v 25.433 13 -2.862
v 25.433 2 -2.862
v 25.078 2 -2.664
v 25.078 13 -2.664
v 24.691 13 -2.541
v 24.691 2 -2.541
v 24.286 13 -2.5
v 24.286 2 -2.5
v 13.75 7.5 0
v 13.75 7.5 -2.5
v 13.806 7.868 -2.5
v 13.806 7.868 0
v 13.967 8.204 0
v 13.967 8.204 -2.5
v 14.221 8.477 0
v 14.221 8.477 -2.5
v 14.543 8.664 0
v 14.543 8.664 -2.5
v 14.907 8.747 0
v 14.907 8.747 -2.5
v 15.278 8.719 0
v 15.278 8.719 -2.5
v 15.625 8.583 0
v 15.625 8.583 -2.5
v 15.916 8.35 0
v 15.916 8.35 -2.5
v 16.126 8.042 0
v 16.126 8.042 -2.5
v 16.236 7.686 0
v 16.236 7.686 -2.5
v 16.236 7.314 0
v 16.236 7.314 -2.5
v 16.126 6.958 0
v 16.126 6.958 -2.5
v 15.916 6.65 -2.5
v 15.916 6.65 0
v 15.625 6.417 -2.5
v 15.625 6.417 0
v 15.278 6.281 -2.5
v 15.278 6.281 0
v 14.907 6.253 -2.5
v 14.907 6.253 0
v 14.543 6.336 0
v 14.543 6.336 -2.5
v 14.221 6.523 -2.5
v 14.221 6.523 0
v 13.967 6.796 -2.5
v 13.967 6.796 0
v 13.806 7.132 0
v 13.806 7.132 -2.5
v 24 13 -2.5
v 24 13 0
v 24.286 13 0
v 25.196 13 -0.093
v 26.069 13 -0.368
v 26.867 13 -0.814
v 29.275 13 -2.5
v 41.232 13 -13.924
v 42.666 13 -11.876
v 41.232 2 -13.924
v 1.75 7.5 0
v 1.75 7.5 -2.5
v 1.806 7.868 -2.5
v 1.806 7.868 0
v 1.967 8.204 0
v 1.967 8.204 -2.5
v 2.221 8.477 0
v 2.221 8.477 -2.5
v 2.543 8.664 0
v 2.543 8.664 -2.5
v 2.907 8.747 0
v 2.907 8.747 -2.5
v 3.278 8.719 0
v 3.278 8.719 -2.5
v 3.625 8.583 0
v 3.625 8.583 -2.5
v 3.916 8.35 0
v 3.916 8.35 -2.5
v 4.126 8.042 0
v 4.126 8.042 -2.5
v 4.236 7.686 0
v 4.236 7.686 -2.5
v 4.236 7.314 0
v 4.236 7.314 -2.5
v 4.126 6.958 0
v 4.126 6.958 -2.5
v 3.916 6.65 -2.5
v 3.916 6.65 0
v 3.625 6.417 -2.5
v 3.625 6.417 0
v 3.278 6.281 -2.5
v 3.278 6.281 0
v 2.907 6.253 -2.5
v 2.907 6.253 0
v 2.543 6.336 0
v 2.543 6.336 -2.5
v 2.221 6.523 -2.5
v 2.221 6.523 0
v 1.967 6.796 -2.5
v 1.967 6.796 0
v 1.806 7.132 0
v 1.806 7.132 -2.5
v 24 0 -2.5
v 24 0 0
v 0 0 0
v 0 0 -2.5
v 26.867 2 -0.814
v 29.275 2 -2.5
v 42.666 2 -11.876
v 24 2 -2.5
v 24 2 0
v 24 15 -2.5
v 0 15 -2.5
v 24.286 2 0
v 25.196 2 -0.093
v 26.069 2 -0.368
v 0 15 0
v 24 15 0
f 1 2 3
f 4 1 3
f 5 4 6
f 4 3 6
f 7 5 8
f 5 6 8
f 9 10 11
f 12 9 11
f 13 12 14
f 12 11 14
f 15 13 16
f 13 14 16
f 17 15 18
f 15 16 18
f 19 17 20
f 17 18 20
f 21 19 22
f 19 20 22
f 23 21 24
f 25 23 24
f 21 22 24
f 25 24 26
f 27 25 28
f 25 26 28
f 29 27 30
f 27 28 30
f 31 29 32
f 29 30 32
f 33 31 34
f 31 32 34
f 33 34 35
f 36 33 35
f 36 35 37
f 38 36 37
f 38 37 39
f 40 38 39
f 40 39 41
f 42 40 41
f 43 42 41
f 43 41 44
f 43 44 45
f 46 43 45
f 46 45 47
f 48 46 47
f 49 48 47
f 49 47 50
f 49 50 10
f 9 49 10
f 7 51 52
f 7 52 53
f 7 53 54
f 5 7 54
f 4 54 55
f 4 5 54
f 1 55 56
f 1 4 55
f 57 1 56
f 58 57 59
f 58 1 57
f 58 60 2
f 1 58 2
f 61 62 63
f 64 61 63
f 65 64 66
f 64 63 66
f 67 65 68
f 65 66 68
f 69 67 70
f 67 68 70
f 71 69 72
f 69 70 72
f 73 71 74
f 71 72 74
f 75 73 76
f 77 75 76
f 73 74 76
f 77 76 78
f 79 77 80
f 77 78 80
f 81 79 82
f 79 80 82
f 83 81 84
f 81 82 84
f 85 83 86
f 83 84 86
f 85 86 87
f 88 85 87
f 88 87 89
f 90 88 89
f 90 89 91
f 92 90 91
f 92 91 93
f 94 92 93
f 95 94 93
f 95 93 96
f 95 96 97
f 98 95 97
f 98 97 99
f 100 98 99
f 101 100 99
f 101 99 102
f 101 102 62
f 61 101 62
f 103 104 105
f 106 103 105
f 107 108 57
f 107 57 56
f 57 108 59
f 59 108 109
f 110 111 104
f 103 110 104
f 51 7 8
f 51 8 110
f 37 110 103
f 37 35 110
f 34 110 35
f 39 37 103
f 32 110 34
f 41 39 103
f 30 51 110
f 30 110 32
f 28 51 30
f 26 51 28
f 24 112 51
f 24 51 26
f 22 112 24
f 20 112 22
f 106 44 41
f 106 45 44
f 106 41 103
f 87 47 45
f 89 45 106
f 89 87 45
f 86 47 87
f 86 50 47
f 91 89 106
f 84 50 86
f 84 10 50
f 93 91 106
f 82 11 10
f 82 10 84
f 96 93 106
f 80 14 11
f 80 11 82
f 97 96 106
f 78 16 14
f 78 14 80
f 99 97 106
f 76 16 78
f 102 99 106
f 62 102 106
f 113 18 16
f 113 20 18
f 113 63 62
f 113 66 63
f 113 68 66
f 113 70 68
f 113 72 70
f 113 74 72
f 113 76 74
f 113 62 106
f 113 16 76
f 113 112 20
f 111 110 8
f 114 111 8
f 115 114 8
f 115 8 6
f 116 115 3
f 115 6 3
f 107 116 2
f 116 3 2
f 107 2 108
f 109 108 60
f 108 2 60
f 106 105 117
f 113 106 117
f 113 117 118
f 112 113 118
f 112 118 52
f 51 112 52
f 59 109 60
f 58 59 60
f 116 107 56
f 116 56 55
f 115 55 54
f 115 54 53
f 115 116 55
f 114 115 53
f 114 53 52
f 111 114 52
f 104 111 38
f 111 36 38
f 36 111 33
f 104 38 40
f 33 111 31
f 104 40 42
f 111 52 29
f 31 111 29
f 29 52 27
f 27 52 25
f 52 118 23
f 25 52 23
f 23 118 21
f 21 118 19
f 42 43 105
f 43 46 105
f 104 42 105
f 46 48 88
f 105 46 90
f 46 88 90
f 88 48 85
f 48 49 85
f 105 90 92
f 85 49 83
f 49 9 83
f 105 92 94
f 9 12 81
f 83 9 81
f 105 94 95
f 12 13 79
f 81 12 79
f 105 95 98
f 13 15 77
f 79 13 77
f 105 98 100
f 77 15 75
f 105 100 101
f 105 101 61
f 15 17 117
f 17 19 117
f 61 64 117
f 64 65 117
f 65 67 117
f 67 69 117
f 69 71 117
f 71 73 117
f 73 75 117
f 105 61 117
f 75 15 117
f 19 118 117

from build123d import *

# Parameters (mm, degrees)
SM_BASE_FLANGE_1_DEPTH = 2.5
HOLE_WIZARD_M31_D      = 2.5
HOLE_WIZARD_M31_DEPTH  = 8.5
HOLE_WIZARD_M31_TIP    = 0.751075774
OTHER_START            = 2
OTHER_1_DEPTH          = 11
OTHER_1_2_DEPTH        = 11


# Read off the part's stored shape, not the designer's step: Нарисованный сгиб1
# Sheet-metal steps are written as plain solids
with BuildPart() as part:
    # Sketch 1 → Базовая кромка1 (new body)
    with BuildSketch(Plane.XY):
        Polygon((24, 15), (24, 13), (44, 13), (44, 2), (24, 2), (24, 0), (0, 0), (0, 15), align=None)
    extrude(amount=-SM_BASE_FLANGE_1_DEPTH)

    # Отверстие обработанное метчиком M31
    with Locations(Plane.XY):
        with Locations((3, 7.5), (15, 7.5)):
            Hole(HOLE_WIZARD_M31_D / 2, depth=HOLE_WIZARD_M31_DEPTH)
            with Locations((0, 0, -(HOLE_WIZARD_M31_DEPTH + HOLE_WIZARD_M31_TIP / 2))):  # 118° drill point
                Cone(0, HOLE_WIZARD_M31_D / 2, HOLE_WIZARD_M31_TIP, mode=Mode.SUBTRACT)

    # Other 1 outline → Other 1 (cut)
    with BuildSketch(Plane(origin=(0, 0, 0), x_dir=(1, 0, 0), z_dir=(0, 1, 0)).offset(OTHER_START)):
        with BuildLine():
            Line((44, 2.5), (29.275370017, 2.5))
            Line((29.275370017, 2.5), (26.867249414, 0.813815801))
            ThreePointArc((26.867249414, 0.813815801), (25.639331548, 0.208273722), (24.28615545, 0))
            Line((24.28615545, 0), (44, 0))
            Line((44, 0), (44, 2.5))
        make_face()
    extrude(amount=OTHER_1_DEPTH, mode=Mode.SUBTRACT)

    # Other 1 2 outline → Other 1 2 (add)
    with BuildSketch(Plane(origin=(0, 0, 0), x_dir=(1, 0, 0), z_dir=(0, 1, 0)).offset(OTHER_START)):
        with BuildLine():
            Line((29.275370017, 2.5), (42.665543077, 11.875900115))
            Line((42.665543077, 11.875900115), (41.231601986, 13.923780225))
            Line((41.231601986, 13.923780225), (25.433308323, 2.861695911))
            ThreePointArc((25.433308323, 2.861695911), (24.887567049, 2.592566099), (24.28615545, 2.5))
            Line((24.28615545, 2.5), (29.275370017, 2.5))
        make_face()
    extrude(amount=OTHER_1_2_DEPTH)


solid = part.part
